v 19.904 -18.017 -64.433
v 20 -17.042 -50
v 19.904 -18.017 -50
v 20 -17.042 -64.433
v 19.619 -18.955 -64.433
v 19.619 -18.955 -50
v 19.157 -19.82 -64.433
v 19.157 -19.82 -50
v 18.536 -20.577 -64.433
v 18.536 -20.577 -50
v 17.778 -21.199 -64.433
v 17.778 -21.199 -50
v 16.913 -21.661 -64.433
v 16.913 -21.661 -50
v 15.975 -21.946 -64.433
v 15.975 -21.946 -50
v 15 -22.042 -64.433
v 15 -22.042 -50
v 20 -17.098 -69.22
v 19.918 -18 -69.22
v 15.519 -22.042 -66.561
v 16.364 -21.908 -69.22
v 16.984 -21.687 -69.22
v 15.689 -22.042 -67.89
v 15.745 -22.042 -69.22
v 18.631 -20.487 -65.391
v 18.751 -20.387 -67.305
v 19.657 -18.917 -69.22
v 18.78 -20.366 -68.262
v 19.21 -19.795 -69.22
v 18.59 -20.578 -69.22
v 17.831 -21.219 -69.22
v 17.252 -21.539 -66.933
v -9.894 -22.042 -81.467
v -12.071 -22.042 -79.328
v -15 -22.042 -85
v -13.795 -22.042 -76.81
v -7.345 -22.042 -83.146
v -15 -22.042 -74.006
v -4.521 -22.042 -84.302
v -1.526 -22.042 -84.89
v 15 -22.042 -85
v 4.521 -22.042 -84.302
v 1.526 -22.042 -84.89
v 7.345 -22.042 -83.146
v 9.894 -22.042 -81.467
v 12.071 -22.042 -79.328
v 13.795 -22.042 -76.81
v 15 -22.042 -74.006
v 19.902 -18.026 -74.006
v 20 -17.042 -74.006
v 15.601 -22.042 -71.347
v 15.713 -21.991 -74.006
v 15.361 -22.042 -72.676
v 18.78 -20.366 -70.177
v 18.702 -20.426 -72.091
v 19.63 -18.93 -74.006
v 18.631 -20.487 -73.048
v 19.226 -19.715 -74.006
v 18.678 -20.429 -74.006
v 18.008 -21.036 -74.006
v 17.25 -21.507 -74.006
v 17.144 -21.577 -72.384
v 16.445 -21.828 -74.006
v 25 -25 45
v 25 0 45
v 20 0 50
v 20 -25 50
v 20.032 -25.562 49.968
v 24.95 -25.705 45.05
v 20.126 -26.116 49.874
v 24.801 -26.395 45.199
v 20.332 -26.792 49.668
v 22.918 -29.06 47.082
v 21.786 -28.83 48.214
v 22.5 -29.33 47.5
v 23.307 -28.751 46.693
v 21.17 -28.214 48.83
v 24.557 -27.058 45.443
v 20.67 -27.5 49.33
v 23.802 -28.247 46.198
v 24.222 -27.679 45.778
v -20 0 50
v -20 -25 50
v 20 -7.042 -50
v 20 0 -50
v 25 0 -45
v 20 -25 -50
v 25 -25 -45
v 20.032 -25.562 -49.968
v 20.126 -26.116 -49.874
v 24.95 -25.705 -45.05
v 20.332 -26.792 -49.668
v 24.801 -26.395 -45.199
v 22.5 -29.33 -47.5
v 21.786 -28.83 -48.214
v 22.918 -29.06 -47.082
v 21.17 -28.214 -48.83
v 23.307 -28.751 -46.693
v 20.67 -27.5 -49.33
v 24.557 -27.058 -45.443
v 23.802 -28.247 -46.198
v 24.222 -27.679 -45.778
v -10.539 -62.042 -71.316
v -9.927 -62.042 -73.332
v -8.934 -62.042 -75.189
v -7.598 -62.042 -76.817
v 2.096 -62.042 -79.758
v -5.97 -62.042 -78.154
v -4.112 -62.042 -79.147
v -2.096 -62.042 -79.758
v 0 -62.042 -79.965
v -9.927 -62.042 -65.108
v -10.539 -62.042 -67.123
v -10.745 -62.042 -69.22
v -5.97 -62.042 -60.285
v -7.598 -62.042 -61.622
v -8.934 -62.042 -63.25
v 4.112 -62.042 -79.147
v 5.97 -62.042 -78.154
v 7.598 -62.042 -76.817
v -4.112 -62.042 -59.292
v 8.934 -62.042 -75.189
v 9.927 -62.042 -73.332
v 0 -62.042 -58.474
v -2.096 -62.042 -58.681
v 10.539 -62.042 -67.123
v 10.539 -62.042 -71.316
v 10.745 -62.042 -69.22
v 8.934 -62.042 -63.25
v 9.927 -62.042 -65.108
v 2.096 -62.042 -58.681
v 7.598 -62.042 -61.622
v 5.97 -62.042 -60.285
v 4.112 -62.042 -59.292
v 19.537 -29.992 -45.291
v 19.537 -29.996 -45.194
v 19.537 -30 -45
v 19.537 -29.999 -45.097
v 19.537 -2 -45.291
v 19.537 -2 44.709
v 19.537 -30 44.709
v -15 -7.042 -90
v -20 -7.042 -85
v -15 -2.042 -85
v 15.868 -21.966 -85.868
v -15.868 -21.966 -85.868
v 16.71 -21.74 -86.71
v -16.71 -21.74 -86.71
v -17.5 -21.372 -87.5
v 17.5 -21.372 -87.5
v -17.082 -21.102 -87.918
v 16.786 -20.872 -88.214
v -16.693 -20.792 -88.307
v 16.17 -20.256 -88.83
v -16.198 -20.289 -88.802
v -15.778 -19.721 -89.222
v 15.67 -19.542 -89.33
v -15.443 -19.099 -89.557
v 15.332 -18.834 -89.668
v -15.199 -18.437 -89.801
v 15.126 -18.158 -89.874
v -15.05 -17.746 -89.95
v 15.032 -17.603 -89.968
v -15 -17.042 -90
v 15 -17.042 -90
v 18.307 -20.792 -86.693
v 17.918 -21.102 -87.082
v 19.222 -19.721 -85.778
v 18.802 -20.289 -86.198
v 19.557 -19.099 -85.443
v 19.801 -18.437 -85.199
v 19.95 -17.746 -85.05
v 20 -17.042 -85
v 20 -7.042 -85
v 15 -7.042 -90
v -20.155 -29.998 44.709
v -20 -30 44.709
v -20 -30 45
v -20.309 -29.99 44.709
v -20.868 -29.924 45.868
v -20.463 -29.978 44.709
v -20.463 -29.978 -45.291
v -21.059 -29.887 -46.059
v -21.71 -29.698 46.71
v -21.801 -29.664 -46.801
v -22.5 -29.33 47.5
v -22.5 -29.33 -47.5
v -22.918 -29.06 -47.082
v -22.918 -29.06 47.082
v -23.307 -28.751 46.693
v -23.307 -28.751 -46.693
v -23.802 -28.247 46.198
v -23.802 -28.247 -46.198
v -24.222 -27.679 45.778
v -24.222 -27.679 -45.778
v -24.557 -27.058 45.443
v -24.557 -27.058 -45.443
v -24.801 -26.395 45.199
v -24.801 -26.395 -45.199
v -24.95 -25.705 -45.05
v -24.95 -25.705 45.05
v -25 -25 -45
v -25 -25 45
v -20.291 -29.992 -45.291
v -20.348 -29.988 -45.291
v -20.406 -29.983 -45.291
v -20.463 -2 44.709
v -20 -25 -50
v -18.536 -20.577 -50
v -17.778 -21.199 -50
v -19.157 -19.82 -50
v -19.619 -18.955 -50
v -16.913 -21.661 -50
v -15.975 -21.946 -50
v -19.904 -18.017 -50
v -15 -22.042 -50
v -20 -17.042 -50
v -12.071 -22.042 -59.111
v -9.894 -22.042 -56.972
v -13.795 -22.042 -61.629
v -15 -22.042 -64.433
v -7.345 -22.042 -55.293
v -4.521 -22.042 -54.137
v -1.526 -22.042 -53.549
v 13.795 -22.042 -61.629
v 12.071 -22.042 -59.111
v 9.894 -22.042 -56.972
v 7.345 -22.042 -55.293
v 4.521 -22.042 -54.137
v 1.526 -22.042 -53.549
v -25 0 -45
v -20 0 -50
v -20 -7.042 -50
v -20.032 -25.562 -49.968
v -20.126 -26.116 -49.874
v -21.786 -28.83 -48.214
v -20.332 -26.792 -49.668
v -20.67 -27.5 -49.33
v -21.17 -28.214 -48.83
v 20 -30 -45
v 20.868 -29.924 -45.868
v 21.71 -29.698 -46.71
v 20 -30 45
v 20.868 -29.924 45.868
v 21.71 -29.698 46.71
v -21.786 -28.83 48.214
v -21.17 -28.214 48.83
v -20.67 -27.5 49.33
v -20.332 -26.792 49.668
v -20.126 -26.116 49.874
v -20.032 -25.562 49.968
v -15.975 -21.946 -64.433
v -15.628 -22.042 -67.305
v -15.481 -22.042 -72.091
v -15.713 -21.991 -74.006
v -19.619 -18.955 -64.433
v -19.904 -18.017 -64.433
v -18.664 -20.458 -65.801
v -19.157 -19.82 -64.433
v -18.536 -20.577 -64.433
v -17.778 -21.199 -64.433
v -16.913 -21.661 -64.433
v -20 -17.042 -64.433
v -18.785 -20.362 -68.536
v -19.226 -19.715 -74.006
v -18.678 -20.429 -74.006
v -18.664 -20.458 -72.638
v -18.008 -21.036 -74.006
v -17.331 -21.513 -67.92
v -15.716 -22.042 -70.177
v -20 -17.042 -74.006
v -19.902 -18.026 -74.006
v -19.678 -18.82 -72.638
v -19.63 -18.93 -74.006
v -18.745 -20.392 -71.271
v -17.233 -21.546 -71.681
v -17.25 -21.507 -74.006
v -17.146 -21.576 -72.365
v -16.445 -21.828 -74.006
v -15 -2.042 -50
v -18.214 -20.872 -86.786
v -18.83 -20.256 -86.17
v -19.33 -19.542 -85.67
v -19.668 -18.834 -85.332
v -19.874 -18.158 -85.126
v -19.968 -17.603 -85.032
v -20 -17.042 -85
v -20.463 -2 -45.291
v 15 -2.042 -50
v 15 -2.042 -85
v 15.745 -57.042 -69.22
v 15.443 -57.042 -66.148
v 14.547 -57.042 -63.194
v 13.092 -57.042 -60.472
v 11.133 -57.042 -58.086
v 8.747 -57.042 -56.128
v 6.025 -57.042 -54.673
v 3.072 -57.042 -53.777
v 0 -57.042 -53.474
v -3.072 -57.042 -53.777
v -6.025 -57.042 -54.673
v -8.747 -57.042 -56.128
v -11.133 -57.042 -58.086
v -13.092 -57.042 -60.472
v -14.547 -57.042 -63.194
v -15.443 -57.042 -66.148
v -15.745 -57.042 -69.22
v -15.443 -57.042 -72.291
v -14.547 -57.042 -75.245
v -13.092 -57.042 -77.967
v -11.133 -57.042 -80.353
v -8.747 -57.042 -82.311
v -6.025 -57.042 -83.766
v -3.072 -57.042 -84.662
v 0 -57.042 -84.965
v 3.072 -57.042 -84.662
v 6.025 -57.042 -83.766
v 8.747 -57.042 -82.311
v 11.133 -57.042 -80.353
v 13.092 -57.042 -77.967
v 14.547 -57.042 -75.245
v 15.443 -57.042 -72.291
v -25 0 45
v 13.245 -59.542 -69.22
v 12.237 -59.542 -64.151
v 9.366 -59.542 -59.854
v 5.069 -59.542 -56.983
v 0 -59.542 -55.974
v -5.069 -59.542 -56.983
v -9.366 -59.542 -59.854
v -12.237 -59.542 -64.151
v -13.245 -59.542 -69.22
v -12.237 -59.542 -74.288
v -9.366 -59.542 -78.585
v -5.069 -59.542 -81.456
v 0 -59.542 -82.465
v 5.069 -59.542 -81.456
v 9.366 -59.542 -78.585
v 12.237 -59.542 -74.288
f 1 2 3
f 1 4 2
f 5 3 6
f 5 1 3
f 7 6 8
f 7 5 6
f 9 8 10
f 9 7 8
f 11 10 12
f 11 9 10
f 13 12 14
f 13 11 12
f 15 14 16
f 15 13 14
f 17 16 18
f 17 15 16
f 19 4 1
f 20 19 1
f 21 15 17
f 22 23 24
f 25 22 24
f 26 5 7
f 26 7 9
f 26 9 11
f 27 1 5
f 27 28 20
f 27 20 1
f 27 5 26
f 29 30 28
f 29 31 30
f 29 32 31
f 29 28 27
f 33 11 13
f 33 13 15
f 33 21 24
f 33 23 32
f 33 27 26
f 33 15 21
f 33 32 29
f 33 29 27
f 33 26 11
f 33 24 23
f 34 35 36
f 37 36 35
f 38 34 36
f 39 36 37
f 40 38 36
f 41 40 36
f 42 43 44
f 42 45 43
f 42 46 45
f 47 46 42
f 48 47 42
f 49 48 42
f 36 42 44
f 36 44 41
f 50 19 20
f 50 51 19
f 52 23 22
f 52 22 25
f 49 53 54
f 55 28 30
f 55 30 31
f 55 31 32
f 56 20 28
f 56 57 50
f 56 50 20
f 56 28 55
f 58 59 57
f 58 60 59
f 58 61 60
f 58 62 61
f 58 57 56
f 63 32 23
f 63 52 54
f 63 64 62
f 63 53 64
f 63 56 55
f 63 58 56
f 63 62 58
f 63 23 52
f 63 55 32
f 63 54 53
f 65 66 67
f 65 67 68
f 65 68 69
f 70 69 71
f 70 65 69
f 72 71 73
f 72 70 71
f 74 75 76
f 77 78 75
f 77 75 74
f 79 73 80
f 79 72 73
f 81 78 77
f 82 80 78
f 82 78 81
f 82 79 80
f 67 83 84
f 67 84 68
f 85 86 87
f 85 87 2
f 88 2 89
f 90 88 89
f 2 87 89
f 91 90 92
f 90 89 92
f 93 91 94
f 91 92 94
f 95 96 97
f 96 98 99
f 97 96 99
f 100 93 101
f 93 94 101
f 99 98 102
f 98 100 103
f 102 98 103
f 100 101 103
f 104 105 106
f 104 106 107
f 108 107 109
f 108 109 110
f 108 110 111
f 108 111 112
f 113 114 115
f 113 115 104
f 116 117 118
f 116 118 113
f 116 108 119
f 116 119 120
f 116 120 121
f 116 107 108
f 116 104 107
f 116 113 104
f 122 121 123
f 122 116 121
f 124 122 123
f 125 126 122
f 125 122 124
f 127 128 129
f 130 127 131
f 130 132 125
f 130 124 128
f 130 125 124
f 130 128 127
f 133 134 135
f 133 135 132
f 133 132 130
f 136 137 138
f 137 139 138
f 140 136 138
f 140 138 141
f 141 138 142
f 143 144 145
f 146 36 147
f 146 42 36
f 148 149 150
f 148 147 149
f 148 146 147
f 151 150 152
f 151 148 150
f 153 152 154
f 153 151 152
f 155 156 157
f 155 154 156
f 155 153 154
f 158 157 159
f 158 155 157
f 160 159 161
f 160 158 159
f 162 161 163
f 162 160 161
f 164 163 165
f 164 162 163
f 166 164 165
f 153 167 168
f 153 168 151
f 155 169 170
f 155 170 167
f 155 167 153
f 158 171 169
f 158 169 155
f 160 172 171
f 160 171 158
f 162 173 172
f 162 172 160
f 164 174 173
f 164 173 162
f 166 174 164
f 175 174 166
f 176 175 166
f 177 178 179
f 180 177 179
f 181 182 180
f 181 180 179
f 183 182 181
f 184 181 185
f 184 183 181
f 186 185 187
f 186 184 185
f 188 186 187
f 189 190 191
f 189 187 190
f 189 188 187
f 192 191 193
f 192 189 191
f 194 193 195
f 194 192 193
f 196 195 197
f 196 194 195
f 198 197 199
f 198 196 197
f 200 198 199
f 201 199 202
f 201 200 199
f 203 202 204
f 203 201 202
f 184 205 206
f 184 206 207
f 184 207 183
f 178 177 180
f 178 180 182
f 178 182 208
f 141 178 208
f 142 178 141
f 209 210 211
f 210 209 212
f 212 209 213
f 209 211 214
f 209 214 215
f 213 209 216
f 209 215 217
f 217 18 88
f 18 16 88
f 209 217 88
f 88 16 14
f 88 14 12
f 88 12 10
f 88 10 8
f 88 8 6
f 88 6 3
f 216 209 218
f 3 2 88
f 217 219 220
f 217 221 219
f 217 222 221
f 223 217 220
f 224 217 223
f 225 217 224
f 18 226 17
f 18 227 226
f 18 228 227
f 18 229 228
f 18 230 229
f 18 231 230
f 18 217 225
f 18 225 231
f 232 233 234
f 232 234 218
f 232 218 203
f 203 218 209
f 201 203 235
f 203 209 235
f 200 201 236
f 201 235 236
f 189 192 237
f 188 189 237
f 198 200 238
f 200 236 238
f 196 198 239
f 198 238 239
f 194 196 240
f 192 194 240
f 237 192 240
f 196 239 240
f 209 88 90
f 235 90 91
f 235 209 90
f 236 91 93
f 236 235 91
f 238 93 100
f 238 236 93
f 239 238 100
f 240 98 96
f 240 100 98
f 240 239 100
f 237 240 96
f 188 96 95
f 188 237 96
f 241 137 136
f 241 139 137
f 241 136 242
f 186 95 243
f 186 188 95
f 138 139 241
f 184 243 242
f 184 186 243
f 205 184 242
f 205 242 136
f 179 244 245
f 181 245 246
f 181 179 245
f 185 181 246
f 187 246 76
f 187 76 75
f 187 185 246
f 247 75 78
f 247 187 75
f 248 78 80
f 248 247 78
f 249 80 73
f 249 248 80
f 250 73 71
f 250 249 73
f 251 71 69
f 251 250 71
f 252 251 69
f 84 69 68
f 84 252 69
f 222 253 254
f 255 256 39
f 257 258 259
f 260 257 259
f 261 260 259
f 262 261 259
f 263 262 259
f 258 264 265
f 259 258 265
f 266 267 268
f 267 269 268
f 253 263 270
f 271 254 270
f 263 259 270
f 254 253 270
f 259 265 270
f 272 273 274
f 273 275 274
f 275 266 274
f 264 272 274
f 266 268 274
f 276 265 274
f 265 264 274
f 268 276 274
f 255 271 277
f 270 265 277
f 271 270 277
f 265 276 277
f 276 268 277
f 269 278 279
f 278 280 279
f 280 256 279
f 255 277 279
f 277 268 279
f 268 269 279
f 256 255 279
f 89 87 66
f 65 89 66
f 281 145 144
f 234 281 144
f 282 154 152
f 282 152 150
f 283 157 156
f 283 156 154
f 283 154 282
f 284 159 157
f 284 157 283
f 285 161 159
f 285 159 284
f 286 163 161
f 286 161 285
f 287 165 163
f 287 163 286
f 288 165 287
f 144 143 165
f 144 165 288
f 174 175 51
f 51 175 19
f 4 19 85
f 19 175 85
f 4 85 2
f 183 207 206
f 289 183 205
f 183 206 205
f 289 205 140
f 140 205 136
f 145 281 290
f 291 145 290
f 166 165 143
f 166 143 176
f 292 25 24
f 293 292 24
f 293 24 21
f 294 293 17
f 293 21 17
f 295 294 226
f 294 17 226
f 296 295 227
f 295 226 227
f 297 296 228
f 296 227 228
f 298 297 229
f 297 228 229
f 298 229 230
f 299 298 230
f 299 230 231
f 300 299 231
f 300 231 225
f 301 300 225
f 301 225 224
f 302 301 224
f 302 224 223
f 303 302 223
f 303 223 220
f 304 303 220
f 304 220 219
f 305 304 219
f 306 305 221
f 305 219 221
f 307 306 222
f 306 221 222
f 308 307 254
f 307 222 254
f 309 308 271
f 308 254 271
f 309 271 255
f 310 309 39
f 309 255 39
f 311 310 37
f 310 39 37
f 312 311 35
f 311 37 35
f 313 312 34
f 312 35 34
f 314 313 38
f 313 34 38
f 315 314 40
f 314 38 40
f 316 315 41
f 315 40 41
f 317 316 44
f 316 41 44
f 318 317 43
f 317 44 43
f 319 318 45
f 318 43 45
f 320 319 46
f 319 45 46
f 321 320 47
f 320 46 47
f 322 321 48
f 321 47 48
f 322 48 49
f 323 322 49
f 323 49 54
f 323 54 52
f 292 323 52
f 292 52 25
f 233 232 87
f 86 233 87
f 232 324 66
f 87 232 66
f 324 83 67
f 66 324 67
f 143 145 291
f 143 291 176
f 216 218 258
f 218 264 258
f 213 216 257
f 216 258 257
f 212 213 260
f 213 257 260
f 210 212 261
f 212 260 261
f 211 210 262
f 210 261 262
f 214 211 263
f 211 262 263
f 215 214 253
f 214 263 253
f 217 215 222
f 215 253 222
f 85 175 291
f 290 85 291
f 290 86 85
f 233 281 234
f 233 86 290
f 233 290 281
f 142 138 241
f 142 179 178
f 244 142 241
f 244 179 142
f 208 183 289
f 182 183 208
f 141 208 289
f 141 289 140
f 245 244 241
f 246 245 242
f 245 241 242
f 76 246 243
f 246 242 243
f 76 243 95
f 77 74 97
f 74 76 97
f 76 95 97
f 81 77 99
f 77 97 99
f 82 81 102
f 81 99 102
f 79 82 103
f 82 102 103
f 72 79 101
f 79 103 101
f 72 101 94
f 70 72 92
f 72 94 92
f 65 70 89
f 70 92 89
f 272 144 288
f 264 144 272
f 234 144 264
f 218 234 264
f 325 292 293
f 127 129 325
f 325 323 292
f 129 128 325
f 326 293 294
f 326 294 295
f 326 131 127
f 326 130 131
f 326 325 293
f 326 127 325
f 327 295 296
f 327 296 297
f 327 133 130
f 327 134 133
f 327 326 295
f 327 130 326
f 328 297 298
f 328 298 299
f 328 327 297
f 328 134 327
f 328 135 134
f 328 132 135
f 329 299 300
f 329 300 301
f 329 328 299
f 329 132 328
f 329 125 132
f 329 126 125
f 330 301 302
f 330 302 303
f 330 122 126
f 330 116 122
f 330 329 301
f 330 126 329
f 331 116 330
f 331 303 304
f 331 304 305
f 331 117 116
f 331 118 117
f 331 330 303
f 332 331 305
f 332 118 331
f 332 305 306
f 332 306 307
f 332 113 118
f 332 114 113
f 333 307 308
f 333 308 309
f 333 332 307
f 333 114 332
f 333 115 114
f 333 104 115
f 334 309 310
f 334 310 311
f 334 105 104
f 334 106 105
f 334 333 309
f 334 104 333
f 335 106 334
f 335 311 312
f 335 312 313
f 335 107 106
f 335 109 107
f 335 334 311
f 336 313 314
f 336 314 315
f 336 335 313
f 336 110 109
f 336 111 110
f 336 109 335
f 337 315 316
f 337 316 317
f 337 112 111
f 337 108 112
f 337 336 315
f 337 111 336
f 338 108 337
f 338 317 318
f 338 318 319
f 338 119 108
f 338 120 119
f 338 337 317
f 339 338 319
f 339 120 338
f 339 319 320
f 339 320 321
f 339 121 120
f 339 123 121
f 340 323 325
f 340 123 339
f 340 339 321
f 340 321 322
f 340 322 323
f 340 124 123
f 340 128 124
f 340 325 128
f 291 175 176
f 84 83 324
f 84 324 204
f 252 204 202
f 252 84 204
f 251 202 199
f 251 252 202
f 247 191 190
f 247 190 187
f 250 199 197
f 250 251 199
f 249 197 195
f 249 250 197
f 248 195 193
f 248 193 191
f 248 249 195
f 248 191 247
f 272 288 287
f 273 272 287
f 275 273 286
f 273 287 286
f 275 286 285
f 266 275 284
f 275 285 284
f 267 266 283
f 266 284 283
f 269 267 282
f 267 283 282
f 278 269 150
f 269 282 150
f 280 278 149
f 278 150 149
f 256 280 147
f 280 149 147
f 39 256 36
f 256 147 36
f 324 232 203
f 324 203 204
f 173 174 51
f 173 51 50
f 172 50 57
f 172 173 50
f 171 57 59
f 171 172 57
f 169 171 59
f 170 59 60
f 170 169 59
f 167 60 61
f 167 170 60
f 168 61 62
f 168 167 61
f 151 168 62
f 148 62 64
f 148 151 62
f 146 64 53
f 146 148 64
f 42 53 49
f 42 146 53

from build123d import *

# Parameters (mm, degrees)
F1_W         = 50
F1_H         = 100
F2_DEPTH     = 30
F4_W         = 40
F4_H         = 90
F5_DEPTH     = 28
F6_SIZE      = 5
F7_T1_DEPTH  = 115
F7_T3_DEPTH  = 65
F8_W         = 40
F8_H         = 20
F9_DEPTH     = 40
F10_R        = 15.7450666382
F11_DEPTH    = 40
F12_R        = 5
F13_T1_DEPTH = 6.3508529611
F13_T3_DEPTH = 6.3508529611
F13_T5_DEPTH = 40.7168298797
F13_T7_DEPTH = 65.7168298797
F13_T9_DEPTH = 52.8584149398


# Not quite as in the source:
# - a fillet or chamfer that OpenCascade refuses, or shapes differently, is made with other operations: its cross-section is extruded or revolved along the edge and cut away or added


with BuildPart() as f2:
    # F1 (on face) → F2 (new body)
    with BuildSketch(Plane.XZ):
        Rectangle(F1_W, F1_H)
    extrude(amount=F2_DEPTH)

    # F4 (on face) → F5 (cut)
    with BuildSketch(Plane.XZ.offset(30)):
        with Locations((-0.4633623362, -0.2909506857)):
            Rectangle(F4_W, F4_H)
    extrude(amount=-F5_DEPTH, mode=Mode.SUBTRACT)

    # F6
    f6_edges = [f2.edges().sort_by_distance(p)[0] for p in [
        (25, -15, 50),
        (-25, -15, 50),
        (-25, -15, -50),
        (25, -15, -50),
    ]]
    chamfer(f6_edges, length=F6_SIZE)

    # F7: fillet of radius 5 on 4 edges, made by hand

    # F7_s2 → F7_t1 (cut)
    with BuildSketch(Plane.XY.offset(-57.5)):
        with BuildLine():
            ThreePointArc((-20, -30), (-23.5355339059, -28.5355339059), (-25, -25))
            Line((-25, -25), (-25, -30))
            Line((-25, -30), (-20, -30))
        make_face()
        with BuildLine():
            ThreePointArc((20, -30), (23.5355339059, -28.5355339059), (25, -25))
            Line((25, -25), (25, -30))
            Line((25, -30), (20, -30))
        make_face()
    extrude(amount=F7_T1_DEPTH, mode=Mode.SUBTRACT)

    # F7_s4 → F7_t3 (cut)
    with BuildSketch(Plane.YZ.offset(-32.5)):
        with BuildLine():
            ThreePointArc((-30, 45), (-28.5355339059, 48.5355339059), (-25, 50))
            Line((-25, 50), (-30, 50))
            Line((-30, 50), (-30, 45))
        make_face()
        with BuildLine():
            ThreePointArc((-25, -50), (-28.5355339059, -48.5355339059), (-30, -45))
            Line((-30, -45), (-30, -50))
            Line((-30, -50), (-25, -50))
        make_face()
    extrude(amount=F7_T3_DEPTH, mode=Mode.SUBTRACT)

    # F8 (on face) → F9 (join)
    with BuildSketch(Plane(origin=(0, 0, -50), x_dir=(1, 0, 0), z_dir=(0, 0, -1))):
        with Locations((0, 12.041676566)):
            Rectangle(F8_W, F8_H)
    extrude(amount=F9_DEPTH)

    # F10 (on face) → F11 (join)
    with BuildSketch(Plane.XZ.offset(22.041676566)):
        with Locations((0, -69.2195519805)):
            Circle(F10_R)
    extrude(amount=F11_DEPTH)

    # F12
    f12_edges = [f2.edges().sort_by_distance(p)[0] for p in [
        (-20, -22.041677, -70),
        (20, -22.041677, -70),
        (0, -22.041677, -90),
    ]]
    fillet(f12_edges, radius=F12_R)

    # F13: chamfer of 5 on 7 edges, made by hand

    # F13_s2 → F13_t1 (cut)
    with BuildSketch(Plane(origin=(-32.652774478, 32.652774478, -32.652774478), x_dir=(-0.7071067812, -0.7071067812, 0), z_dir=(-0.5773502692, 0.5773502692, -0.5773502692))):
        Polygon((12.0502850626, -64.1119959897), (19.1213528745, -64.1119959897), (15.5858189685, -70.2357203466), align=None)
    extrude(amount=F13_T1_DEPTH, mode=Mode.SUBTRACT)

    # F13_s4 → F13_t3 (cut)
    with BuildSketch(Plane(origin=(32.652774478, 32.652774478, -32.652774478), x_dir=(-0.7071067812, 0.7071067812, 0), z_dir=(0.5773502692, 0.5773502692, -0.5773502692))):
        Polygon((-19.1213528745, -64.1119959897), (-15.5858189685, -70.2357203466), (-12.0502850626, -64.1119959897), align=None)
    extrude(amount=F13_T3_DEPTH, mode=Mode.SUBTRACT)

    # F13_s6 → F13_t5 (cut)
    with BuildSketch(Plane.XZ.offset(-10.8167383738)):
        Polygon((-15, -90), (-20, -85), (-20, -90), align=None)
        Polygon((20, -85), (15, -90), (20, -90), align=None)
    extrude(amount=F13_T5_DEPTH, mode=Mode.SUBTRACT)

    # F13_s8 → F13_t7 (cut)
    with BuildSketch(Plane.YZ.offset(-32.8584149398)):
        Polygon((-2.041676566, -85), (-7.041676566, -90), (-2.041676566, -90), align=None)
    extrude(amount=F13_T7_DEPTH, mode=Mode.SUBTRACT)

    # F13_s10 → F13_t9 (cut)
    with BuildSketch(Plane.XY.offset(-102.8584149398)):
        Polygon((20, -7.041676566), (15, -2.041676566), (20, -2.041676566), align=None)
        Polygon((-15, -2.041676566), (-20, -7.041676566), (-20, -2.041676566), align=None)
    extrude(amount=F13_T9_DEPTH, mode=Mode.SUBTRACT)

    # F13_s11 → F13_t12 (revolve, cut)
    with BuildSketch(Plane.XY.offset(-69.2195519805)):
        Polygon((15.7450666382, -57.041676566), (10.7450666382, -62.041676566), (15.7450666382, -62.041676566), align=None)
    revolve(axis=Axis((0, -62.041676566, -69.2195519805), (0, -1, 0)), mode=Mode.SUBTRACT)


solid = f2.part
